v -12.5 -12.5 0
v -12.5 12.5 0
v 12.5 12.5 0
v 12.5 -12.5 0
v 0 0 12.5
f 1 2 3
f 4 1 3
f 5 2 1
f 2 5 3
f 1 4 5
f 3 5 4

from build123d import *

# Parameters (mm, degrees)
F0_W          = 25
F0_H          = 25
F1_DEPTH      = 25
F3_DEPTH      = 12.501
F3_DEPTH_BACK = 12.501
F5_DEPTH      = 12.501
F5_DEPTH_BACK = 12.501


with BuildPart() as f1:
    # F0 (on Top) → F1 (new body)
    with BuildSketch(Plane.XY):
        Rectangle(F0_W, F0_H)
    extrude(amount=F1_DEPTH)

    # F2 (on Right) → F3 (cut, two sides)
    with BuildSketch(Plane.YZ) as f3_sk:
        Polygon((0, 12.5), (12.5, 0), (12.5, 25), (-12.5, 25), (-12.5, 0), align=None)
    extrude(amount=-F3_DEPTH, mode=Mode.SUBTRACT)
    extrude(f3_sk.sketch, amount=F3_DEPTH_BACK, mode=Mode.SUBTRACT)

    # F4 (on Front) → F5 (cut, two sides)
    with BuildSketch(Plane.XZ) as f5_sk:
        Polygon((0, 12.5), (12.5, 0), (12.5, 25), (-12.5, 25), (-12.5, 0), align=None)
    extrude(amount=-F5_DEPTH, mode=Mode.SUBTRACT)
    extrude(f5_sk.sketch, amount=F5_DEPTH_BACK, mode=Mode.SUBTRACT)


solid = f1.part
